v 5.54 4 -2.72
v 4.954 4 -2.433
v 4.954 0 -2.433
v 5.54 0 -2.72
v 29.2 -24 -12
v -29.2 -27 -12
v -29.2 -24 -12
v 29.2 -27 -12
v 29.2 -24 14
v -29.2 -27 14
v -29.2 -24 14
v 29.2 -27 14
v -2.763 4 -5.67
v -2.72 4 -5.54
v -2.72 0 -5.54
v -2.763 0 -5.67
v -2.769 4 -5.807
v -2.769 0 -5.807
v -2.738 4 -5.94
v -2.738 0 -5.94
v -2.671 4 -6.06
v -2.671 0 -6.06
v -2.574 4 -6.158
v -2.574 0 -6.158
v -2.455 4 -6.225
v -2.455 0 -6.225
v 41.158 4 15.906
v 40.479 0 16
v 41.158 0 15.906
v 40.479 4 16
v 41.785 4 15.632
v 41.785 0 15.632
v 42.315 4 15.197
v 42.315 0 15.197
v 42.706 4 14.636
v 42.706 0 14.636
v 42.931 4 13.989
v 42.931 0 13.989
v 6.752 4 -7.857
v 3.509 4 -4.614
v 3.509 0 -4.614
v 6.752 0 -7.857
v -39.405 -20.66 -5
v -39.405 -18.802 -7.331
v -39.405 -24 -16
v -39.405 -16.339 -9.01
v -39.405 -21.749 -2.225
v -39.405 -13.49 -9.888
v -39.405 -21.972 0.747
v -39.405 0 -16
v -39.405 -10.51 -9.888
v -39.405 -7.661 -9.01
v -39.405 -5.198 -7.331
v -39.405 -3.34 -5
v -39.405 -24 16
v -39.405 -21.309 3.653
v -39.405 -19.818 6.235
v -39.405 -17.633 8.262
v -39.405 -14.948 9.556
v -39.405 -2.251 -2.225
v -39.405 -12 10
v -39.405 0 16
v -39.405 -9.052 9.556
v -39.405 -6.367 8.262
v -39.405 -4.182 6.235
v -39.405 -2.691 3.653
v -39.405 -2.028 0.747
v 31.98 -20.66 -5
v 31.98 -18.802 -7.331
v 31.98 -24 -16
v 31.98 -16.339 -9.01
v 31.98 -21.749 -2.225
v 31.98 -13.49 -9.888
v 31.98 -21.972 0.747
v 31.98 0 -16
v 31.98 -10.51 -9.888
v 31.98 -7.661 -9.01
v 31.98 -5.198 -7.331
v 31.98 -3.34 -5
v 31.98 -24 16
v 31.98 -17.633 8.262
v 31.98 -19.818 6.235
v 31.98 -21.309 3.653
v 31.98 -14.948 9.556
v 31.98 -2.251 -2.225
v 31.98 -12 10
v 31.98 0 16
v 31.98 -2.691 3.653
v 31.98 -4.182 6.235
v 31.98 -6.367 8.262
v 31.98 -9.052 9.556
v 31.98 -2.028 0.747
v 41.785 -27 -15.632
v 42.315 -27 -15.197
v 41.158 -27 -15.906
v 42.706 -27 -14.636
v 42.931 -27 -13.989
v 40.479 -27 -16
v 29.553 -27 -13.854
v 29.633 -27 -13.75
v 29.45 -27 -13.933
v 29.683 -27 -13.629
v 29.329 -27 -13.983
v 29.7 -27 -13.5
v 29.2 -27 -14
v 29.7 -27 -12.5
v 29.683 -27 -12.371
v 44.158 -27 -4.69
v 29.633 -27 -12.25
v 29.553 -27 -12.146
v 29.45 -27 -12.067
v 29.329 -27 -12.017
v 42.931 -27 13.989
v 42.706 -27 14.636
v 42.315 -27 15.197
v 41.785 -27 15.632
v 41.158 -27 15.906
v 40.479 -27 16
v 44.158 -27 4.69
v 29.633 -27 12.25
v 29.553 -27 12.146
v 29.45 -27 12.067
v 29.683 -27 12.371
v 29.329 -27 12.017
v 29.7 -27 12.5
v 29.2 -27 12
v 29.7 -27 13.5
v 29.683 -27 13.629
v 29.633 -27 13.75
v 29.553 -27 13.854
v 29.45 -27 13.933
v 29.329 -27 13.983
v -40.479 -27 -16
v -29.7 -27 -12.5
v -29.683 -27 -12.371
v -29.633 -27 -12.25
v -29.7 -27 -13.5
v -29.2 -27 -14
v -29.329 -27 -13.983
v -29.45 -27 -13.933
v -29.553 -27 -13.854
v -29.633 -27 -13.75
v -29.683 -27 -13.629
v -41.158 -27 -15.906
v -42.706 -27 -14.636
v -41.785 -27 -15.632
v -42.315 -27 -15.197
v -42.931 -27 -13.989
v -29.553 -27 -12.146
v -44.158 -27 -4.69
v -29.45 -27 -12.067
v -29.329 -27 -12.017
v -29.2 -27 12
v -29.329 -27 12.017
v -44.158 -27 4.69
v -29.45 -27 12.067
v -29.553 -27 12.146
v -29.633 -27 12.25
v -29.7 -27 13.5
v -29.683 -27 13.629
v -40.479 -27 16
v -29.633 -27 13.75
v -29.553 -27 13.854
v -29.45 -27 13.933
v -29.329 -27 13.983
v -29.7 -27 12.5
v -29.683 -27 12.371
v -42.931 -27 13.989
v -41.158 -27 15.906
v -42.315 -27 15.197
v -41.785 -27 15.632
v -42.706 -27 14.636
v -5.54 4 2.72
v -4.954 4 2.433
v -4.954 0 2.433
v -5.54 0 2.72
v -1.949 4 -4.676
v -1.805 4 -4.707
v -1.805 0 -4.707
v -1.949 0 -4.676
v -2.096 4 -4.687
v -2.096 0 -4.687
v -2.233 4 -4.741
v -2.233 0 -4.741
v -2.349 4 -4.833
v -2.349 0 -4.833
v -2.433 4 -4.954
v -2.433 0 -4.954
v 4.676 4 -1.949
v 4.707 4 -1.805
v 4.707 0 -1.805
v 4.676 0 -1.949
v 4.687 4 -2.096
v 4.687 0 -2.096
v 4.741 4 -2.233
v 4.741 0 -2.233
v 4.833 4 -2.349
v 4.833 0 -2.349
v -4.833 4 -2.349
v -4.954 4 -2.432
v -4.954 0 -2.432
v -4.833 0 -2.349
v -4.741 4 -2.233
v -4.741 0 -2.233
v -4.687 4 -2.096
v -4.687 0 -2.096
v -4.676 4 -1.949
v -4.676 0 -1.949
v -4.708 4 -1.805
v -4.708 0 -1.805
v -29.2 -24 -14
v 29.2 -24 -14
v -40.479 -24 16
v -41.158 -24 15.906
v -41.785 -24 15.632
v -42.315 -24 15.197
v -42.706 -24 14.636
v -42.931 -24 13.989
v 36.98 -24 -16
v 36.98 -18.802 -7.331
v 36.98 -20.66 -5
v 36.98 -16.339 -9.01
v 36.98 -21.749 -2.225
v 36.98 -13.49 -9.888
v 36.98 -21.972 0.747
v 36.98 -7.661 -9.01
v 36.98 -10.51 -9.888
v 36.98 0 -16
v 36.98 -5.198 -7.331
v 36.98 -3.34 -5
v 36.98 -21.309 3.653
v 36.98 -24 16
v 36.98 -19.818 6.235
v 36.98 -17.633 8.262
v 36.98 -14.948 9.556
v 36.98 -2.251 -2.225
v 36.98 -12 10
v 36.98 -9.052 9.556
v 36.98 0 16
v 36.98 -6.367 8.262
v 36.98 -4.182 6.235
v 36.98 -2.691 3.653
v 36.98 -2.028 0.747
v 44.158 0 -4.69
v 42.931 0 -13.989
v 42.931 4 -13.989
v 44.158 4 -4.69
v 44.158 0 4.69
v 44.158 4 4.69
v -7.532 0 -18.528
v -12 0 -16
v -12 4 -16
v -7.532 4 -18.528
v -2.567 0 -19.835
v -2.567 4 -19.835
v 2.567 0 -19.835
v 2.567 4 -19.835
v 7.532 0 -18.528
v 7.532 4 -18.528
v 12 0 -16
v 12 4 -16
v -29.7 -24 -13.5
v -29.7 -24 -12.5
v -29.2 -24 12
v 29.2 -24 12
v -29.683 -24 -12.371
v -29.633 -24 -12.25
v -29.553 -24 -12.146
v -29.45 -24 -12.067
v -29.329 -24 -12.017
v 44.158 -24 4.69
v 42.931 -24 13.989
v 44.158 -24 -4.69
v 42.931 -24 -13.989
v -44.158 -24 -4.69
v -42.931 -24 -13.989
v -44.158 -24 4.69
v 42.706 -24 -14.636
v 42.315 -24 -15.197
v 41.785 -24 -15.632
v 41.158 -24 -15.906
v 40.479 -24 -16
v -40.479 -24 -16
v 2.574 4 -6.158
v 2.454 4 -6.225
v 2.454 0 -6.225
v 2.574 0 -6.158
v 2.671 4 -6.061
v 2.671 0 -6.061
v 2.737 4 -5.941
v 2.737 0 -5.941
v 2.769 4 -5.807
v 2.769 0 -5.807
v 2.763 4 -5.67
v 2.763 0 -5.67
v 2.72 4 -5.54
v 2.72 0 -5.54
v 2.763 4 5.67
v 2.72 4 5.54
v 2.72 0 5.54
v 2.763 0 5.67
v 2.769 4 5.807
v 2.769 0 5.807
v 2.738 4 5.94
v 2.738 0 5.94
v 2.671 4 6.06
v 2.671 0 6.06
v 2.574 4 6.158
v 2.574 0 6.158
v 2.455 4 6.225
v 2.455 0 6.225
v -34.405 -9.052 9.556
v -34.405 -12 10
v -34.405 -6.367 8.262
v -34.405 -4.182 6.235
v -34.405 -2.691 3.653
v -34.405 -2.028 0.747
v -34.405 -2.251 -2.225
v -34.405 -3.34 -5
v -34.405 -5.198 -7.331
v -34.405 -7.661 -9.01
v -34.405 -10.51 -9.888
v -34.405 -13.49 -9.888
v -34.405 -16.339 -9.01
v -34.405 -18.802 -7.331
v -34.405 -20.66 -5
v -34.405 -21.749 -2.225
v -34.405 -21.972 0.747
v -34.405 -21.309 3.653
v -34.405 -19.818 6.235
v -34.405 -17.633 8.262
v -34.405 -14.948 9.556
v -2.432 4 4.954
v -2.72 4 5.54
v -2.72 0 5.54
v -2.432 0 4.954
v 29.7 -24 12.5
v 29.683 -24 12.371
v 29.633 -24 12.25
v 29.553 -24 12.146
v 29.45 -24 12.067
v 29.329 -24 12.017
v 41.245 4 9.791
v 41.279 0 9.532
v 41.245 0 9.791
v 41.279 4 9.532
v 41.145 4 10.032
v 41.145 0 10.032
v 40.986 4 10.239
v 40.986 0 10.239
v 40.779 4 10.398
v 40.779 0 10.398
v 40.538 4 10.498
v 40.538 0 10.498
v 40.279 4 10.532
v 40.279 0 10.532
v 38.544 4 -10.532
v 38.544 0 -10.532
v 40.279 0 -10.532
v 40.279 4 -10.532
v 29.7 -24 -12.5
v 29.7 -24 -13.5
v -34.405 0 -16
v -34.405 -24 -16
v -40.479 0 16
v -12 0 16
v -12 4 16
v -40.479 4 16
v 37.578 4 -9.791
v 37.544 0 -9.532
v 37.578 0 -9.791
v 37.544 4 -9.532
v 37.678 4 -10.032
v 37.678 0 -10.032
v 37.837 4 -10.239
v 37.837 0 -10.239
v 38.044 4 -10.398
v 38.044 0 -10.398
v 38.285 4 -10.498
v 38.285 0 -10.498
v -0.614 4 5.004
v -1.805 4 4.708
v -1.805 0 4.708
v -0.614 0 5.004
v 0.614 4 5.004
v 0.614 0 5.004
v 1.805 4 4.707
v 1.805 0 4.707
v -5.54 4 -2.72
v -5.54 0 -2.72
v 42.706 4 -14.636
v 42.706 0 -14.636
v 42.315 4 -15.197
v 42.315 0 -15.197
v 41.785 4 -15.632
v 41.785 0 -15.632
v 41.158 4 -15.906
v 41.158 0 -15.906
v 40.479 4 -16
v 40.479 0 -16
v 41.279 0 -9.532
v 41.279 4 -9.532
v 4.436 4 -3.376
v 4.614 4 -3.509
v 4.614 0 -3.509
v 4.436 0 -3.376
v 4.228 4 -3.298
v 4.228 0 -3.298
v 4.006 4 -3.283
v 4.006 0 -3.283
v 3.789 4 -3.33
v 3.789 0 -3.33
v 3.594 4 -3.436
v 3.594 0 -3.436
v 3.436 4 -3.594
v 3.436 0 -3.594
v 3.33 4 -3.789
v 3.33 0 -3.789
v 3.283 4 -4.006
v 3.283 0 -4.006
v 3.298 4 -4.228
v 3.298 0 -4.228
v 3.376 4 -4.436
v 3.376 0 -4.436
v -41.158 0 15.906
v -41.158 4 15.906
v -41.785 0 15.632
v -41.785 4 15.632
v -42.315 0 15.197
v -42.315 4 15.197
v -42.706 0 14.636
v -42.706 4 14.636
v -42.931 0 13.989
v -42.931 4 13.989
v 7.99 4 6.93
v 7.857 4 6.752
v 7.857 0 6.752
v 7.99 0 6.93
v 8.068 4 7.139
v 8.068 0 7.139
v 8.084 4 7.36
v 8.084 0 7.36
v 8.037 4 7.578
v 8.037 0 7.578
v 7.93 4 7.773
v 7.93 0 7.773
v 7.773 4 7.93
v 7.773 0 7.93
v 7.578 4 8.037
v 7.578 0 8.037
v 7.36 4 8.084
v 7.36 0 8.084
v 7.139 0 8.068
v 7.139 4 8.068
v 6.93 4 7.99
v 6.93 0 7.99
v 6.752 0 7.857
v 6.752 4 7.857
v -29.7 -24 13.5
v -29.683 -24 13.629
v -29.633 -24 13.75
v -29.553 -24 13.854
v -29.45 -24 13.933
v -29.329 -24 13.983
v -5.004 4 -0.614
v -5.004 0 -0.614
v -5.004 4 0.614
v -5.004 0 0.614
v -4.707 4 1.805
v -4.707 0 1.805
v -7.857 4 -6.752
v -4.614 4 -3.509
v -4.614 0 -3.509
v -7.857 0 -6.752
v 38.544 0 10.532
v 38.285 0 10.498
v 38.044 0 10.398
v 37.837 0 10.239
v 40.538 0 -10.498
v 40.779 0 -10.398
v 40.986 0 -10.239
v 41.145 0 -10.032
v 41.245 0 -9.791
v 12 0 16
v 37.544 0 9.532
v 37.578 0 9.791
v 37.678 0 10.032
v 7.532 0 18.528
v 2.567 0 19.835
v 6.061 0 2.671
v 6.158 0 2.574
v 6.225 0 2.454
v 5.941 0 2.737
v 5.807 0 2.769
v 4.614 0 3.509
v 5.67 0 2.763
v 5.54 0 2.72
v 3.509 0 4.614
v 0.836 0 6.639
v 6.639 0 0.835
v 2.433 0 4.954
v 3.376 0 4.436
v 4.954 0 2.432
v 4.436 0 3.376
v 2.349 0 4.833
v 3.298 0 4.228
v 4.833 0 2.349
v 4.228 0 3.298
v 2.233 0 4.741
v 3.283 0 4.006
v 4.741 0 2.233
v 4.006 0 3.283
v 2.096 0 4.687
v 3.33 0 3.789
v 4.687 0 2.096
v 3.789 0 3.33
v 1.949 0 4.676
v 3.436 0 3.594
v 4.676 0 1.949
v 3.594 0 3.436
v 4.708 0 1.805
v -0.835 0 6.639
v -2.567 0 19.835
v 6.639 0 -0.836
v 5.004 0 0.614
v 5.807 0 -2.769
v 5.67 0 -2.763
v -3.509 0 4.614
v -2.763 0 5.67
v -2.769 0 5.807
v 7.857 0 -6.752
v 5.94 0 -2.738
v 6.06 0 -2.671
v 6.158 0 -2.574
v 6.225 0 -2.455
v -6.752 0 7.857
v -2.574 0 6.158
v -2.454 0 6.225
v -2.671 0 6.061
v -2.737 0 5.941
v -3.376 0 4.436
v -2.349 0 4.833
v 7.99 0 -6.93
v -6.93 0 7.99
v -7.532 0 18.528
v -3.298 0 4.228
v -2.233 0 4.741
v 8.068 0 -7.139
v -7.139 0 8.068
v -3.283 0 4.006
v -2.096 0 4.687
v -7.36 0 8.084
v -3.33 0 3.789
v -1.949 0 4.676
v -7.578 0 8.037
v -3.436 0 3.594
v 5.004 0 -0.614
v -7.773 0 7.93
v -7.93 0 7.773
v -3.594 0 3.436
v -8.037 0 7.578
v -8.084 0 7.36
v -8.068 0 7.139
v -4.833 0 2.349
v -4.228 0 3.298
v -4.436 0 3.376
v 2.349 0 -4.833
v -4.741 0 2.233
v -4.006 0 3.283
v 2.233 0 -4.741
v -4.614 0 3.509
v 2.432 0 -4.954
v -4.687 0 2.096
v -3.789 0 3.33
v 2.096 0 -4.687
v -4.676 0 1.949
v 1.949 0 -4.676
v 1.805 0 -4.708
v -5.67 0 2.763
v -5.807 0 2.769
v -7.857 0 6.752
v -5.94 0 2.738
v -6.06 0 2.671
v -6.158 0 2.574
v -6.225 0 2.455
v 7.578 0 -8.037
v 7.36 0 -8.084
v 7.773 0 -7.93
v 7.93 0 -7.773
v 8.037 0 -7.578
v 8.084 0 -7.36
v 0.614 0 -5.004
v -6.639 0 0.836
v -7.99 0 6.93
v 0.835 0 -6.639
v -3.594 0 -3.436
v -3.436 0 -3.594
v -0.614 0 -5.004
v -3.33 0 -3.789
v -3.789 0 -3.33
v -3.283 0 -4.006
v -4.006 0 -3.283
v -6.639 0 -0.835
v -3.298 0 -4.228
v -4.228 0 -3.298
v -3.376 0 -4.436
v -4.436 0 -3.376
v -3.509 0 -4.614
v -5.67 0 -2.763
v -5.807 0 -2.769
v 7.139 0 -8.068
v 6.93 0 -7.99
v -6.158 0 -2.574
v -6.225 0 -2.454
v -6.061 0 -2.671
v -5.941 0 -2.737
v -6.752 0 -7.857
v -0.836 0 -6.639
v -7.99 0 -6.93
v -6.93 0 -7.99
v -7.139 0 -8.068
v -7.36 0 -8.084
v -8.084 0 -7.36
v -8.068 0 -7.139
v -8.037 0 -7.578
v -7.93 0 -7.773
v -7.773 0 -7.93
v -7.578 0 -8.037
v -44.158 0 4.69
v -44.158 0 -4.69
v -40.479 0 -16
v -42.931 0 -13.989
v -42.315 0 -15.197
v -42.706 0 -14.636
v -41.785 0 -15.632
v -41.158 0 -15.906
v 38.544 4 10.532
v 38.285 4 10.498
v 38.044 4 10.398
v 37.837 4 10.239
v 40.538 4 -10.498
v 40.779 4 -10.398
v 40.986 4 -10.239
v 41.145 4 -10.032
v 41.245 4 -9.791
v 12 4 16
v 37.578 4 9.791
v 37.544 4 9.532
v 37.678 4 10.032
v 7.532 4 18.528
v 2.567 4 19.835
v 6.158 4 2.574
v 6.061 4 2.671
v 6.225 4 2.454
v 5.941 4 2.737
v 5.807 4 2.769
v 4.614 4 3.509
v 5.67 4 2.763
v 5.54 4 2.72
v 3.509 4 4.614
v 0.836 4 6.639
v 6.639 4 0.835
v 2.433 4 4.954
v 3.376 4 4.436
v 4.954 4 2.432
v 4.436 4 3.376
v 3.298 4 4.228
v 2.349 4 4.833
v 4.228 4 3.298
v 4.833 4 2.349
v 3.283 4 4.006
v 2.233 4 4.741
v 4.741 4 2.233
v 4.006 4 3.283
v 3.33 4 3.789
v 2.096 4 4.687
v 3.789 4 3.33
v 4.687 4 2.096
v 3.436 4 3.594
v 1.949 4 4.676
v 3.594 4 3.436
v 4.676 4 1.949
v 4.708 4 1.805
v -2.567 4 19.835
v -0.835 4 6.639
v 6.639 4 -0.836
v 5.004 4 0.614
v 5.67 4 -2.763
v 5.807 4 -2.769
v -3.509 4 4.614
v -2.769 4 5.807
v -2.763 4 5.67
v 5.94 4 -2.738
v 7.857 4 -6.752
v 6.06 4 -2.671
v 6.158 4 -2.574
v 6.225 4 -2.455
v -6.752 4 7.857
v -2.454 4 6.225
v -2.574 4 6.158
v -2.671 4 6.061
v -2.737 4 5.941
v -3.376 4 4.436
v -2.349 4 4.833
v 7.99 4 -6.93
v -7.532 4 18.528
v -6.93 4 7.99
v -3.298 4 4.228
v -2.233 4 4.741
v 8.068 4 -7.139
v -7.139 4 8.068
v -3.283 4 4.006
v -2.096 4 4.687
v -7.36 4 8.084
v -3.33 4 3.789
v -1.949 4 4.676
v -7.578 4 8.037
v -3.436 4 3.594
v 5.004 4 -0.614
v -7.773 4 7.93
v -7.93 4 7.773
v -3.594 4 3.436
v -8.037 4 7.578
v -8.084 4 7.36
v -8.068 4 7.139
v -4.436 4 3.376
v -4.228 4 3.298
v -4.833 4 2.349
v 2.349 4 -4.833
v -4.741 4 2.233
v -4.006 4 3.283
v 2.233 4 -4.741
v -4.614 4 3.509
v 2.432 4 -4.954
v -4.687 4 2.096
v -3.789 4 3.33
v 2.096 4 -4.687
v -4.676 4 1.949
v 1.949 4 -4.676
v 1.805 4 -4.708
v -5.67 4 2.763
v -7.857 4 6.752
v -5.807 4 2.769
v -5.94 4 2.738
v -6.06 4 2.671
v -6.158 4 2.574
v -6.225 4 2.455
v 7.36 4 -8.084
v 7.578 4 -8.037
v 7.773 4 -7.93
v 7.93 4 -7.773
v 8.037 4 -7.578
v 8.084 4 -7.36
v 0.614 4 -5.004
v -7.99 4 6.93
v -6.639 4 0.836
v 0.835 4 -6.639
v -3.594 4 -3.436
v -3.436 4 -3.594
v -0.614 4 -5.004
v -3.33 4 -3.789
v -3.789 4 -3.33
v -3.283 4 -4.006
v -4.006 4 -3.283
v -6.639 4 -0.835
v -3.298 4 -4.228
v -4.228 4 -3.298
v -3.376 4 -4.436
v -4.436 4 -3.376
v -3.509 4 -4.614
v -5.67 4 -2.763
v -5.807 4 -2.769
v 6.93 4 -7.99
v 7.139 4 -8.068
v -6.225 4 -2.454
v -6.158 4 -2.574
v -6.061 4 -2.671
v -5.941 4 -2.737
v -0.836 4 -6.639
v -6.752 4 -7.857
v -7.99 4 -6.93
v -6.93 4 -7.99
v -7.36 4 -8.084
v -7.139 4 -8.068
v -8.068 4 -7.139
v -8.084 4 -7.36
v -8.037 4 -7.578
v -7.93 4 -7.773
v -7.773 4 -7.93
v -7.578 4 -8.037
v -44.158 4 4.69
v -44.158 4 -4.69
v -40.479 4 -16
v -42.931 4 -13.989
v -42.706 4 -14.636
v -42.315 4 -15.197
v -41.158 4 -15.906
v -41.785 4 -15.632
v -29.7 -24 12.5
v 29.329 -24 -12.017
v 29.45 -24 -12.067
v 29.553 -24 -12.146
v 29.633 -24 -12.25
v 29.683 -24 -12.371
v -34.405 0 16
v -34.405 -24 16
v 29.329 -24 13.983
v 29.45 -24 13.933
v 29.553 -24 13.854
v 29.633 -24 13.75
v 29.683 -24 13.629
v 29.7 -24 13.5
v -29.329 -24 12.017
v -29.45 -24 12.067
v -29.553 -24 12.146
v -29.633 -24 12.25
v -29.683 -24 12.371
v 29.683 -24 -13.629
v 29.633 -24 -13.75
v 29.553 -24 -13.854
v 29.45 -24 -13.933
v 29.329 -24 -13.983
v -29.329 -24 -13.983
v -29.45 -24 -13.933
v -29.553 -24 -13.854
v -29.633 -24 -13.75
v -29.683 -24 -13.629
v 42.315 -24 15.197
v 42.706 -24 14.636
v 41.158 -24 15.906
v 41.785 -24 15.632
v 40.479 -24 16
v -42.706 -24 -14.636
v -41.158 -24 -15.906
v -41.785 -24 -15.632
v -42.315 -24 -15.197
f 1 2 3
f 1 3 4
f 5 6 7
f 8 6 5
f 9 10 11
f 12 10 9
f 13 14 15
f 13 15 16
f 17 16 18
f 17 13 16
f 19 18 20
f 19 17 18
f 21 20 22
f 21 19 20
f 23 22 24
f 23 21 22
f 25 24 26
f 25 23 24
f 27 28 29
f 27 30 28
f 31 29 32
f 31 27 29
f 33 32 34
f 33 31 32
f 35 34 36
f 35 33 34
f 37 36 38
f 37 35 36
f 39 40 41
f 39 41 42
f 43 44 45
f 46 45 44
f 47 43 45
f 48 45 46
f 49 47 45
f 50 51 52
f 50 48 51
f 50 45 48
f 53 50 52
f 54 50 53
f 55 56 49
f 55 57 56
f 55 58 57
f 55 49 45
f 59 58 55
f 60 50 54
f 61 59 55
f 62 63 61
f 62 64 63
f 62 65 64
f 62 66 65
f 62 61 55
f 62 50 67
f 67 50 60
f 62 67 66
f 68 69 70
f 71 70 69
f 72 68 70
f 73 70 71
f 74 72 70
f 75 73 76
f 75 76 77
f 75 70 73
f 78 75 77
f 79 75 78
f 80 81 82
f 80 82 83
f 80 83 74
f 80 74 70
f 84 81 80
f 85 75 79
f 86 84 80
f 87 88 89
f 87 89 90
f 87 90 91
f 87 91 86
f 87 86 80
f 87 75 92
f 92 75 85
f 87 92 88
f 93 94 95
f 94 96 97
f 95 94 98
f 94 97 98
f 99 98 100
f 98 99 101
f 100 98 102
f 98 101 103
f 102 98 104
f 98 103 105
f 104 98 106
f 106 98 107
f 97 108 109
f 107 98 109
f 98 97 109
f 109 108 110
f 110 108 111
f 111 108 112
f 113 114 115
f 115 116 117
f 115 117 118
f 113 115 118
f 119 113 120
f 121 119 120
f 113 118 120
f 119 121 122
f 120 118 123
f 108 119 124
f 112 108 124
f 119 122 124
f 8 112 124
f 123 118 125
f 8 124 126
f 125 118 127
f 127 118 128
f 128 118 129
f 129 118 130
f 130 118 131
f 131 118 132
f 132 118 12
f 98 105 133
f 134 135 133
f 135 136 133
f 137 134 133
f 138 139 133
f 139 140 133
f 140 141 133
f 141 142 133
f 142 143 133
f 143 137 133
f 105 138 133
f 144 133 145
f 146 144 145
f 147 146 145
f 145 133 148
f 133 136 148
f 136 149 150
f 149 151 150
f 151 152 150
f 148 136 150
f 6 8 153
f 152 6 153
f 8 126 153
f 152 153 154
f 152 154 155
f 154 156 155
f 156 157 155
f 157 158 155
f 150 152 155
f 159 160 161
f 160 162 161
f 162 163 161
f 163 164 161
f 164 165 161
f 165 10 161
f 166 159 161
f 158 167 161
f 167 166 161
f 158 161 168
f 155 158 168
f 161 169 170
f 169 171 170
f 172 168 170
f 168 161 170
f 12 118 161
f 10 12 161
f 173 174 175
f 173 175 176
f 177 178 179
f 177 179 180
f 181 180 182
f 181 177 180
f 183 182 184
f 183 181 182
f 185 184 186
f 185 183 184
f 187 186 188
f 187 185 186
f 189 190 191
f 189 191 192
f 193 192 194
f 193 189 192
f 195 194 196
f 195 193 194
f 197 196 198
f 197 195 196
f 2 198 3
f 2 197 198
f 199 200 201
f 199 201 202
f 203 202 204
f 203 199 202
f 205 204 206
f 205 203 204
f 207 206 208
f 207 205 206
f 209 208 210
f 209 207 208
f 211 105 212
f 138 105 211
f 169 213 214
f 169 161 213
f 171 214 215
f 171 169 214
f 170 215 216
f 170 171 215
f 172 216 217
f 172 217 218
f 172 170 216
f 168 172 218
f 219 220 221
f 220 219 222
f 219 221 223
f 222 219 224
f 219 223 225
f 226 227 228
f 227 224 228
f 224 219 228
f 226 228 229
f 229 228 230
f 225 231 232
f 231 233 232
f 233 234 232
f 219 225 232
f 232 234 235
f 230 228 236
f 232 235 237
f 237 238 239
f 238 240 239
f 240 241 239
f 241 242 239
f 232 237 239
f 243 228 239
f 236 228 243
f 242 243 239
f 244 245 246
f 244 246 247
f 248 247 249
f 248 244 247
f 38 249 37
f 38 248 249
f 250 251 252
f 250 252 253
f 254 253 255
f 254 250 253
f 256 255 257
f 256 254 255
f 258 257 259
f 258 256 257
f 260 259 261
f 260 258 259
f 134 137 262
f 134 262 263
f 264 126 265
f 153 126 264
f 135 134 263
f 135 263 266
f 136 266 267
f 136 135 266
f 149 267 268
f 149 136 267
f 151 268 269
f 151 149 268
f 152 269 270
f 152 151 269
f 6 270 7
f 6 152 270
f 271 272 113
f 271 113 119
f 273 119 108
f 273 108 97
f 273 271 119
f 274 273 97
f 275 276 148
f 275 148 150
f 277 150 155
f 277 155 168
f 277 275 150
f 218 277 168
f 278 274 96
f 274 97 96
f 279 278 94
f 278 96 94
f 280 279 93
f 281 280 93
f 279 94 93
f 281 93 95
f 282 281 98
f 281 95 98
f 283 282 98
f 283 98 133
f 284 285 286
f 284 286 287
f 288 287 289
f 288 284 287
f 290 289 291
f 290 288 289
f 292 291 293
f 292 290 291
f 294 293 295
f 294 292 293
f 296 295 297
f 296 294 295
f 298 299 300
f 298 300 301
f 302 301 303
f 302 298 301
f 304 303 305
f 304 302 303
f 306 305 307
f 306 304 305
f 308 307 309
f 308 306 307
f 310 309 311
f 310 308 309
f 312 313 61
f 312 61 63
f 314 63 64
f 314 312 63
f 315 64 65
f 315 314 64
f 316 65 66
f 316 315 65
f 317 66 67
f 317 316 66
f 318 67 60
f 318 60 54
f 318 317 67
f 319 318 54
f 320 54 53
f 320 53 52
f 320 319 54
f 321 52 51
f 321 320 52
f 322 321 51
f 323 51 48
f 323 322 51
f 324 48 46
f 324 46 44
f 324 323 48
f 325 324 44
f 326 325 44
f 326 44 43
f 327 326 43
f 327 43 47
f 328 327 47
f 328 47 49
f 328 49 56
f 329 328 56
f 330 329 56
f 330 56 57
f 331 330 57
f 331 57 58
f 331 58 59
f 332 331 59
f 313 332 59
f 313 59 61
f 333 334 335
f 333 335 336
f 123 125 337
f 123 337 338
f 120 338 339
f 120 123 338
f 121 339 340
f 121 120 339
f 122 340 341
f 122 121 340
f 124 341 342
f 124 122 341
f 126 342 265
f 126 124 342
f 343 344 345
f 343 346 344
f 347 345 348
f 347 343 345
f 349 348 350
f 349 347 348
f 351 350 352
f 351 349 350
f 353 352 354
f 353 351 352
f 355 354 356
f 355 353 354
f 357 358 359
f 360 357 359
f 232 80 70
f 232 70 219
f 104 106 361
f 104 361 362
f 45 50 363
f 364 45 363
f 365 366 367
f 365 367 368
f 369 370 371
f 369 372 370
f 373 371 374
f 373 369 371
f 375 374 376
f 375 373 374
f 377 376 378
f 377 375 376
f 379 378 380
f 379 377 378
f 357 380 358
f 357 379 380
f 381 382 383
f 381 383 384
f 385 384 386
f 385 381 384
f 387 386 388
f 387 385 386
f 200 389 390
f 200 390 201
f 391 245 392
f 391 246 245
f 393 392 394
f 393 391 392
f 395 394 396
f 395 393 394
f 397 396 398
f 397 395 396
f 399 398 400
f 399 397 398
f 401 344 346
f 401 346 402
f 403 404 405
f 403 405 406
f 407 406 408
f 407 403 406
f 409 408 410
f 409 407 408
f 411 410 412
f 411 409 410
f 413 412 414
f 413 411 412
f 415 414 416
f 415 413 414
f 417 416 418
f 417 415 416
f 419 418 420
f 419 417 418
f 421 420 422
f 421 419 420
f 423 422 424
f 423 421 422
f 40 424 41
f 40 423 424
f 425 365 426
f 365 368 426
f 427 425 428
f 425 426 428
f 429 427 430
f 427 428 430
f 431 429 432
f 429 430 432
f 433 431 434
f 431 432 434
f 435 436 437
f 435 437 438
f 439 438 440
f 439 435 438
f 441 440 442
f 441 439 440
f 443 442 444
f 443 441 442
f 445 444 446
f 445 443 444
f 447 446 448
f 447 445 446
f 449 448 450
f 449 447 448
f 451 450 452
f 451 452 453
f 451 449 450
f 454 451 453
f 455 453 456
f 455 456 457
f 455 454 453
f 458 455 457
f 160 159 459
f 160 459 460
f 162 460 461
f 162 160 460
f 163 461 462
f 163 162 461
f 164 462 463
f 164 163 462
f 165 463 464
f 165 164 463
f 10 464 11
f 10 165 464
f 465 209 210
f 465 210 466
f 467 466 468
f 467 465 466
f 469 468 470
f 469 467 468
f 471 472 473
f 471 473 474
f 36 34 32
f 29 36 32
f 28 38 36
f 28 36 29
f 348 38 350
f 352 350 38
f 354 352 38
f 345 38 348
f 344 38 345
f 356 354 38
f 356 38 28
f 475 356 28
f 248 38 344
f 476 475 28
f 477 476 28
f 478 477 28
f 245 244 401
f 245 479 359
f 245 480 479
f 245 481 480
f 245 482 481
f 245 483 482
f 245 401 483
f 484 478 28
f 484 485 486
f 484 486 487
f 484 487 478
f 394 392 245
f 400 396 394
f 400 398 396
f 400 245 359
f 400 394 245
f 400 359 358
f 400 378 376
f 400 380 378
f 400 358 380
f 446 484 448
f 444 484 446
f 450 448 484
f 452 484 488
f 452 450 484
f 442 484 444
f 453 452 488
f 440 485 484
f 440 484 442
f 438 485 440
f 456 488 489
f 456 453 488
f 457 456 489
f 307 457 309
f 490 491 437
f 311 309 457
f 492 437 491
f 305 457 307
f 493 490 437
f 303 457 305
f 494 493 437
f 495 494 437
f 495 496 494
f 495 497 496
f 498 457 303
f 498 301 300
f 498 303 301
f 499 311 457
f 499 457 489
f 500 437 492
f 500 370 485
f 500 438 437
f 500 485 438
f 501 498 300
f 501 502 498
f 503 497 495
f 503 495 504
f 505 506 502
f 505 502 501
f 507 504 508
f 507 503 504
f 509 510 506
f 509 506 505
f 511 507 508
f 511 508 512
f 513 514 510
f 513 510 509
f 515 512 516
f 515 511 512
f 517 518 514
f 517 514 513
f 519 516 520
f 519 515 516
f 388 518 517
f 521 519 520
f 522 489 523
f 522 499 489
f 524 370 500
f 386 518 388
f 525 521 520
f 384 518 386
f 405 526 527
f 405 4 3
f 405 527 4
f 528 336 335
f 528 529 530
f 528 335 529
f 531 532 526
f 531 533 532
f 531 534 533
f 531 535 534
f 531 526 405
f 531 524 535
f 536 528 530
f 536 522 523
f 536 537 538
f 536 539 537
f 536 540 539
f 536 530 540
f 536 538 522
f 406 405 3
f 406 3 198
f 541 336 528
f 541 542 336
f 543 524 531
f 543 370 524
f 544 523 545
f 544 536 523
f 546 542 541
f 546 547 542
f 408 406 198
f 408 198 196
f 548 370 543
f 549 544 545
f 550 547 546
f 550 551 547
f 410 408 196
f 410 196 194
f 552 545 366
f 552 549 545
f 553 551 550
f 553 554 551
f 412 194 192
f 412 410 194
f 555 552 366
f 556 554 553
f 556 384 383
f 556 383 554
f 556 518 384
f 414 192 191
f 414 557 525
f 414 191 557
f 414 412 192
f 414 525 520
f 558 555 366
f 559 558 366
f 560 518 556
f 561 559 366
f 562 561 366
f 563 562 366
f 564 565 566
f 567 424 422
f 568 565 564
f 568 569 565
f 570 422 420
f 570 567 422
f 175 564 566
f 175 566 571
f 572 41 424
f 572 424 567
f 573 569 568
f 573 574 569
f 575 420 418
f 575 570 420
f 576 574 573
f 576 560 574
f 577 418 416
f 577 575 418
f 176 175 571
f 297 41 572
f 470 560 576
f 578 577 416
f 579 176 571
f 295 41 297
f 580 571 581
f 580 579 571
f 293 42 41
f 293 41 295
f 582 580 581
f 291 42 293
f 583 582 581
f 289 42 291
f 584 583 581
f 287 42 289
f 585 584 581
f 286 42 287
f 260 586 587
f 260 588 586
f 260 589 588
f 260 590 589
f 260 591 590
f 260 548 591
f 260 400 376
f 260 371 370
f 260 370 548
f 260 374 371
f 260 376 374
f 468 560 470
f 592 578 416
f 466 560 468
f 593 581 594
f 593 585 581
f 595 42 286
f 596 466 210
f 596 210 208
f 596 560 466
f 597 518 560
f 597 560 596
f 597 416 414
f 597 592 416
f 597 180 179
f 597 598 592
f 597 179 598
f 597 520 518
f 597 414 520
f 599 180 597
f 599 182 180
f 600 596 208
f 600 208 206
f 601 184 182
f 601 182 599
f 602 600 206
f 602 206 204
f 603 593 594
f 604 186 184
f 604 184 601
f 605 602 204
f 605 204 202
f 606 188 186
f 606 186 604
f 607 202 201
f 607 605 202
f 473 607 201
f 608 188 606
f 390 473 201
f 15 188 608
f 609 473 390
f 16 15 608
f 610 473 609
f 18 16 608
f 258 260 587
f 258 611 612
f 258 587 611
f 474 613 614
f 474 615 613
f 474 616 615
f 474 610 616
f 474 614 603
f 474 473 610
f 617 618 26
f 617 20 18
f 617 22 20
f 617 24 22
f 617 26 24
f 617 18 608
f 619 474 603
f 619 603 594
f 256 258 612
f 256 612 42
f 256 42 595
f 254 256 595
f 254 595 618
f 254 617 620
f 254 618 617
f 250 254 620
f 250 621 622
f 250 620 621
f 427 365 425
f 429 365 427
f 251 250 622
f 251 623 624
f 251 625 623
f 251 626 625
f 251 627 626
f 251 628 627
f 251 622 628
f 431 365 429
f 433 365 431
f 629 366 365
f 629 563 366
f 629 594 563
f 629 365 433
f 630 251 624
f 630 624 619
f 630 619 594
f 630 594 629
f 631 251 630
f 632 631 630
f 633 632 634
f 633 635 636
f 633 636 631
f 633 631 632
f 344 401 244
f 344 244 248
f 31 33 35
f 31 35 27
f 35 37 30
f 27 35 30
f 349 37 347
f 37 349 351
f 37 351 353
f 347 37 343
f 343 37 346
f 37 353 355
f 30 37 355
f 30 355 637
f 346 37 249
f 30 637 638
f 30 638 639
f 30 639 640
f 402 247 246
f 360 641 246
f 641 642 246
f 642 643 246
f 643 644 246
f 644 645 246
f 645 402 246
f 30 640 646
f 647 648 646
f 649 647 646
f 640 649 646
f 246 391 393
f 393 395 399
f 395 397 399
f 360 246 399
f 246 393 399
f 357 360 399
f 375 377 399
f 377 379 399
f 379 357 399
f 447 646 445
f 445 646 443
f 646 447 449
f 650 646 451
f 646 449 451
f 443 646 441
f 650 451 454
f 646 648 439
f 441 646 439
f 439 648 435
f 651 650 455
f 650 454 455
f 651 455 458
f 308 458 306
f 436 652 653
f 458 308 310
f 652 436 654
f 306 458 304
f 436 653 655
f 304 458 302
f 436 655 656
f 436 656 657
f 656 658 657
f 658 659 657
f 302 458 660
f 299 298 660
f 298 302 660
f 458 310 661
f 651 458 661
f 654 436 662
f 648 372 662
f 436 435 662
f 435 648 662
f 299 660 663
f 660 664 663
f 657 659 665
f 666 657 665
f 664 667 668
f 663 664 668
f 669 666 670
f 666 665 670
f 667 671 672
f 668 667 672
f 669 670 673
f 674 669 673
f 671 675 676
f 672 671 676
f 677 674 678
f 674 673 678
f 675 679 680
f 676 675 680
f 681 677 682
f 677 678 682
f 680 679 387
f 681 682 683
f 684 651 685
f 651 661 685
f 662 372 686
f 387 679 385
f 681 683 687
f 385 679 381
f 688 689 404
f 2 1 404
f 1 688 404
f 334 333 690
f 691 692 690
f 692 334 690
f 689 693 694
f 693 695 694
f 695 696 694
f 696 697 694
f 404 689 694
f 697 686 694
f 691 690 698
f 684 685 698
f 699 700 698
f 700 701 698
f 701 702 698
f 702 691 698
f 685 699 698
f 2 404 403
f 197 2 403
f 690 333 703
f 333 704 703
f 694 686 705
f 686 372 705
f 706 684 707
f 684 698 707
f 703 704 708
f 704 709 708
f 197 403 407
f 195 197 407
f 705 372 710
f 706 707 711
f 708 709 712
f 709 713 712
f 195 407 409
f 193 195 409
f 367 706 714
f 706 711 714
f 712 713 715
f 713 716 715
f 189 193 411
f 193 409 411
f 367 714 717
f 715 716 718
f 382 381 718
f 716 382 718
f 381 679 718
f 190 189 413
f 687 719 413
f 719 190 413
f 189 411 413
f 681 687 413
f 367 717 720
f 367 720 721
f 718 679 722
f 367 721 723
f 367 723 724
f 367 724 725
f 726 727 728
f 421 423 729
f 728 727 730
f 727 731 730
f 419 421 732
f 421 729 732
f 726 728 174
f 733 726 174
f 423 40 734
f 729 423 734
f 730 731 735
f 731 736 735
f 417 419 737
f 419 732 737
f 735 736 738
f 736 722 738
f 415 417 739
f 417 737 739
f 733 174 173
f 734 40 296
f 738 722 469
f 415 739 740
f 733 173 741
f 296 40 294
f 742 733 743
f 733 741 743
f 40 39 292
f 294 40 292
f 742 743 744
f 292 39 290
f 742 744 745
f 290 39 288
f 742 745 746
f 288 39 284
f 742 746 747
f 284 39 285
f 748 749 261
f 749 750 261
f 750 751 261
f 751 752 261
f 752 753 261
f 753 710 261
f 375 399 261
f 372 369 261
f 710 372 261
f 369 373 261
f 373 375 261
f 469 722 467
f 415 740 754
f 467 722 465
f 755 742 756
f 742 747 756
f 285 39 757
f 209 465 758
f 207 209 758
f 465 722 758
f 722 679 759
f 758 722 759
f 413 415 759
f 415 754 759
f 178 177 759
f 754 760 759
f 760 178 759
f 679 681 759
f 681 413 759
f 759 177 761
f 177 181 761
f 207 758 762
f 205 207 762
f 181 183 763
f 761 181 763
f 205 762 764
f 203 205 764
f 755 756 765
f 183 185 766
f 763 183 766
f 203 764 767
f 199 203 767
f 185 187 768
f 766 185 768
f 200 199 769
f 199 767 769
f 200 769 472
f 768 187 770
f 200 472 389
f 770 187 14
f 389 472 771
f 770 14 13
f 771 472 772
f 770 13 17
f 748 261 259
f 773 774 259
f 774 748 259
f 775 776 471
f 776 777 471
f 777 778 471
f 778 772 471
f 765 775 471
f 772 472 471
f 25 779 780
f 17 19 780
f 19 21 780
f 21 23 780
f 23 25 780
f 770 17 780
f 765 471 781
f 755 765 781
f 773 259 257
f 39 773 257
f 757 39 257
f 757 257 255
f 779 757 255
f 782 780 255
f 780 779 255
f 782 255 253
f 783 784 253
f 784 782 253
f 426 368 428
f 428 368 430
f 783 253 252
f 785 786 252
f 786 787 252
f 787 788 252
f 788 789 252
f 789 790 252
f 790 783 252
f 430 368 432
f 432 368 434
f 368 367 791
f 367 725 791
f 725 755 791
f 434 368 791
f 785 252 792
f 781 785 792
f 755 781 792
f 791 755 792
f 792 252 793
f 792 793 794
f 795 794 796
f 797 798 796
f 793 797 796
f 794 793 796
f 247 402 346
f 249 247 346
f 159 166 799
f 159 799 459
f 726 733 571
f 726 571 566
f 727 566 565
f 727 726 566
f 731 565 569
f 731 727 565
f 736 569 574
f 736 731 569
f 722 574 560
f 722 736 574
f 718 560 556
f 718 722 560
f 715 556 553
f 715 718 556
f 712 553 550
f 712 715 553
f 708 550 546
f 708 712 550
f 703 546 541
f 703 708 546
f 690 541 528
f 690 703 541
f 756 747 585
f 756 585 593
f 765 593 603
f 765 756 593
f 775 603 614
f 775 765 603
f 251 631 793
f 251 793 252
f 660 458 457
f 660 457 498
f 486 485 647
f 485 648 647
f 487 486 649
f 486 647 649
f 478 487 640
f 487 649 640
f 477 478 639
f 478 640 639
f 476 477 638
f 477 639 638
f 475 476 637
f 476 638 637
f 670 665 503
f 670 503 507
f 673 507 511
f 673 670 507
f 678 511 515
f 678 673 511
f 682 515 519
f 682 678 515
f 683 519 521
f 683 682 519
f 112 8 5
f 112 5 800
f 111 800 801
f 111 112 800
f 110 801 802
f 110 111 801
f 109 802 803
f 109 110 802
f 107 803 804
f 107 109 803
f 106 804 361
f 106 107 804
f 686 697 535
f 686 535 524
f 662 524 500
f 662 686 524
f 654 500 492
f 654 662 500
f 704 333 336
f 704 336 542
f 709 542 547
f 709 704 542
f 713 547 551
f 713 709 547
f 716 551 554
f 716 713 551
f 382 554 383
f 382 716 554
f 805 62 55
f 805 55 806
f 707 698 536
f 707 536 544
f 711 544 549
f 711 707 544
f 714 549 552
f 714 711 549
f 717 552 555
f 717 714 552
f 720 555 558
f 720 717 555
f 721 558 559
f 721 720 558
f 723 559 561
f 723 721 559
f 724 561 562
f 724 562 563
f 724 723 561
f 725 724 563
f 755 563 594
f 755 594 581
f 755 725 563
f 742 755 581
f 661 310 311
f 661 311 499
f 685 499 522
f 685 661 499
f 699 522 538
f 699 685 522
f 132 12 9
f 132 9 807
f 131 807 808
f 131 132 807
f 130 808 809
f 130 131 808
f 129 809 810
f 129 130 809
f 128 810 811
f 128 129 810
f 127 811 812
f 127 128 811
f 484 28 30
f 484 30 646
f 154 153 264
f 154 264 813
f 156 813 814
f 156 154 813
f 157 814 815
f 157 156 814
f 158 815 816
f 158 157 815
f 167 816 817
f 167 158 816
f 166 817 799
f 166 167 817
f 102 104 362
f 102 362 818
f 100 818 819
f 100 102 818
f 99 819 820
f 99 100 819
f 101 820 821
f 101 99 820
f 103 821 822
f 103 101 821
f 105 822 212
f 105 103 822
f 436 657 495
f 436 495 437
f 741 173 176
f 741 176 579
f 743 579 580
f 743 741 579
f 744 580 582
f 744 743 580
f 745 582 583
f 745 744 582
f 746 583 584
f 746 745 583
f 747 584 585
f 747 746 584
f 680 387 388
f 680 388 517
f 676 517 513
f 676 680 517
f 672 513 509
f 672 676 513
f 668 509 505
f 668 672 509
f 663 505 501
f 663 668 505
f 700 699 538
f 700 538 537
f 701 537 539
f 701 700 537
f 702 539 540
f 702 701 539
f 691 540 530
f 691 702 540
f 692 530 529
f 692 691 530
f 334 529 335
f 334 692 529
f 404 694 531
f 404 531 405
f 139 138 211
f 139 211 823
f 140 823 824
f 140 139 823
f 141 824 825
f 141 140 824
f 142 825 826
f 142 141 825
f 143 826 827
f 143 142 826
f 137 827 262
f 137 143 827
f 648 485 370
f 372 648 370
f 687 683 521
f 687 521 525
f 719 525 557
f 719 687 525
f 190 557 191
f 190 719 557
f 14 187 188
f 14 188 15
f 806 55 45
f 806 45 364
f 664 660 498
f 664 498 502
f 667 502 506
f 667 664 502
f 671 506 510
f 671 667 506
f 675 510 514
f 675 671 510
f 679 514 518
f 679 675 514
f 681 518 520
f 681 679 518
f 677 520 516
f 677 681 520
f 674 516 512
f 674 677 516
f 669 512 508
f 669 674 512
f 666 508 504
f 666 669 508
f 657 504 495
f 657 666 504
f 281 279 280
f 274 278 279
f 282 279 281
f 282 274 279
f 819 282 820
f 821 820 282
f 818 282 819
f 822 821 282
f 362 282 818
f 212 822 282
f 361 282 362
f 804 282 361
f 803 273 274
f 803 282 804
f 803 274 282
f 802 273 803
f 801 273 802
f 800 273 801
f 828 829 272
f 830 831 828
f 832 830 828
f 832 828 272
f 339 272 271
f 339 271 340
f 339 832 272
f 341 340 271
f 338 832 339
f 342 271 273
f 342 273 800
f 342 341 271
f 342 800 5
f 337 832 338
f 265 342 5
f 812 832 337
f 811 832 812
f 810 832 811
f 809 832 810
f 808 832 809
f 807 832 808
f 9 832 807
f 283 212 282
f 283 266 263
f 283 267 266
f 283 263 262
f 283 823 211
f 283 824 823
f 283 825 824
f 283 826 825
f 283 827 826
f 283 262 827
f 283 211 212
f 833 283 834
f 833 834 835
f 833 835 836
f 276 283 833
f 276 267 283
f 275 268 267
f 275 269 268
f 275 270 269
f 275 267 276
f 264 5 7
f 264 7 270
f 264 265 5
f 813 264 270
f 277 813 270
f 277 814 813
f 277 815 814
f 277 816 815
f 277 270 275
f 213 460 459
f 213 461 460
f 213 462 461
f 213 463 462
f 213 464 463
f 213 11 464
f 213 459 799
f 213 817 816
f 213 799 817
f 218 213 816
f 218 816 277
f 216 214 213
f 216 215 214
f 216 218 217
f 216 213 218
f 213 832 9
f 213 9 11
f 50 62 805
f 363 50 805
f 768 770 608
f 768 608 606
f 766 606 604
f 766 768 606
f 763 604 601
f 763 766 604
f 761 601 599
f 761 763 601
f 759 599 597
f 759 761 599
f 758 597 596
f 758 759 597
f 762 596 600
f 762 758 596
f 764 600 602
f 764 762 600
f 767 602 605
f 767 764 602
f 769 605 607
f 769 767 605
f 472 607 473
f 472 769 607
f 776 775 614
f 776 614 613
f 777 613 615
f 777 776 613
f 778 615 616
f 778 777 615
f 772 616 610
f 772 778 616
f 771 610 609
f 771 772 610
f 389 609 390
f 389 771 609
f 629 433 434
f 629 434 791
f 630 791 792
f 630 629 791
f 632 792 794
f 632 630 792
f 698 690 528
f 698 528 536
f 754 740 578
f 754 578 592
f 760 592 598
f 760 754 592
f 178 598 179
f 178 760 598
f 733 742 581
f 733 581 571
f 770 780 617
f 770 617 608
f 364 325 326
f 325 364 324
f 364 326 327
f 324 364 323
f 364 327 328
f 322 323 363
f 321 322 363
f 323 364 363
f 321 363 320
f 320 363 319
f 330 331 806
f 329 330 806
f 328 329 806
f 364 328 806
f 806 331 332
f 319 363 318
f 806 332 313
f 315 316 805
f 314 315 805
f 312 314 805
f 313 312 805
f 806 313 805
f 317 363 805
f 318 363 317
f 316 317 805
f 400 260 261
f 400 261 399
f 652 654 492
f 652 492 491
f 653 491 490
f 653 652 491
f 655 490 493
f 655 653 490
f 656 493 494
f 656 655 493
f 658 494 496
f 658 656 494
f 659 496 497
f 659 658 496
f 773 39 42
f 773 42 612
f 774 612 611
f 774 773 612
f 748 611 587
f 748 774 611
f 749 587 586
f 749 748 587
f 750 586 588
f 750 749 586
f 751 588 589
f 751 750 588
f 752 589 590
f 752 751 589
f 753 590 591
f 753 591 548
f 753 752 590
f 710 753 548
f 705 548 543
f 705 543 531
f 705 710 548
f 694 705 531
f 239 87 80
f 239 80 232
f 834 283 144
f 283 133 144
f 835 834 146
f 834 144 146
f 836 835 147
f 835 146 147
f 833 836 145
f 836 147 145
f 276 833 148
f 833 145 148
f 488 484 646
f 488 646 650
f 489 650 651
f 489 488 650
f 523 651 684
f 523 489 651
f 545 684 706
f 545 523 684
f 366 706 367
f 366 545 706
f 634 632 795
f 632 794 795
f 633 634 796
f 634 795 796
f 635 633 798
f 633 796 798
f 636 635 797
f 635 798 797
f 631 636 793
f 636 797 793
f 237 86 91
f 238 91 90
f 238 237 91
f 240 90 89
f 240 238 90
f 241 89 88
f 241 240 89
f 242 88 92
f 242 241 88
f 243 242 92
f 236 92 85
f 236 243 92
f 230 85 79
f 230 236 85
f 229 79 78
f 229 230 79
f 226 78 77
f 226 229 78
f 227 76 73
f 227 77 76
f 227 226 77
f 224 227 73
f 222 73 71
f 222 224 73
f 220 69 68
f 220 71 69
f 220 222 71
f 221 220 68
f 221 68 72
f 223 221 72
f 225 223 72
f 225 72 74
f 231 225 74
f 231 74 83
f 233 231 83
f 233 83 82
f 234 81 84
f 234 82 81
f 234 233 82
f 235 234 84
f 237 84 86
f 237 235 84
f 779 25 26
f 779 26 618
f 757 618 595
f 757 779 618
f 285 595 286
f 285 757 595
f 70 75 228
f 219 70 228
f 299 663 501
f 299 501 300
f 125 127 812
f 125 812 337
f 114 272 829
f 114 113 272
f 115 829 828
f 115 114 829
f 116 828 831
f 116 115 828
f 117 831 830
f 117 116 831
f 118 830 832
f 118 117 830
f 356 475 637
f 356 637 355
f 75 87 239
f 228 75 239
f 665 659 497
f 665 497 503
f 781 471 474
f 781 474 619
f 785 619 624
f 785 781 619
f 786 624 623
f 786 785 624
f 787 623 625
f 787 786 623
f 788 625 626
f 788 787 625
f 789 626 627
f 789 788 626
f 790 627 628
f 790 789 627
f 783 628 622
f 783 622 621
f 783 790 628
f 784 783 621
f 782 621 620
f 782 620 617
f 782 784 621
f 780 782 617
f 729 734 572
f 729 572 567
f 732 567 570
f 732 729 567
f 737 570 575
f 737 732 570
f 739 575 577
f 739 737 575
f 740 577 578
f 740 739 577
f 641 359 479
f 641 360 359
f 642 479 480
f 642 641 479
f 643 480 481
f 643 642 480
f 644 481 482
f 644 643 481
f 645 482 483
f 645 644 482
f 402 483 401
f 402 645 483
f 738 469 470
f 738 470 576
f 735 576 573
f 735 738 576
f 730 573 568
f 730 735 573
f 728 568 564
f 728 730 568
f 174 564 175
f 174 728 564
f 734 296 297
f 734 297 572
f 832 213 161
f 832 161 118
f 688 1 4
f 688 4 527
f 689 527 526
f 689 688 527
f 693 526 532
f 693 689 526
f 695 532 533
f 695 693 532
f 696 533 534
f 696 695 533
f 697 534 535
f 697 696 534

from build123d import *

# Parameters (mm, degrees)
SKETCH3_W             = 3.734694983
SKETCH3_H             = 21.06352889
BOSS_EXTRUDE1_DEPTH   = 4
SKETCH4_W             = 5
SKETCH4_H             = 32
BOSS_EXTRUDE2_DEPTH   = 24
BOSS_EXTRUDE2_2_DEPTH = 24
BOSS_EXTRUDE3_DEPTH   = 3
CUT_EXTRUDE1_DEPTH    = 3
FILLET3_R             = 2.5
FILLET4_R             = 2.5
FILLET5_R             = 1
CUT_EXTRUDE2_DEPTH    = 4
CUT_EXTRUDE3_START    = -76.384302
SKETCH8_R             = 10
CUT_EXTRUDE3_DEPTH    = 76.384302


with BuildPart() as part:
    # Sketch3 → Boss-Extrude1 (new body)
    with BuildSketch(Plane(origin=(0, 0, 0), x_dir=(1, 0, 0), z_dir=(0, 1, 0))):
        with BuildLine():
            Line((-12, -16), (-42.5, -16))
            ThreePointArc((-42.5, -16), (-44.311632106, 0), (-42.5, 16))
            Line((-42.5, 16), (-12, 16))
            ThreePointArc((-12, 16), (0, 20), (12, 16))
            Line((12, 16), (42.5, 16))
            ThreePointArc((42.5, 16), (44.311632106, 0), (42.5, -16))
            Line((42.5, -16), (12, -16))
            ThreePointArc((12, -16), (0, -20), (-12, -16))
        make_face()
        with Locations((39.411338735, 0)):
            Rectangle(SKETCH3_W, SKETCH3_H, mode=Mode.SUBTRACT)
    extrude(amount=BOSS_EXTRUDE1_DEPTH)

    # Fillet4
    fillet4_edges = [part.edges().sort_by_distance(p)[0] for p in [
        (-42.5, 2, -16),
        (42.5, 2, -16),
        (42.5, 2, 16),
        (-42.5, 2, 16),
    ]]
    fillet(fillet4_edges, radius=FILLET4_R)

    # Fillet5
    fillet5_edges = [part.edges().sort_by_distance(p)[0] for p in [
        (41.278686226, 2, 10.531764445),
        (41.278686226, 2, -10.531764445),
        (37.543991243, 2, -10.531764445),
        (37.543991243, 2, 10.531764445),
    ]]
    fillet(fillet5_edges, radius=FILLET5_R)

    # Sketch7 → Cut-Extrude2 (cut)
    with BuildSketch(Plane(origin=(0, 4, 0), x_dir=(1, 0, 0), z_dir=(0, 1, 0))):
        with BuildLine():
            Line((4.614223874, -3.509411454), (7.857111921, -6.752299502))
            ThreePointArc((7.857111921, -6.752299502), (7.857111921, -7.857111921), (6.752299502, -7.857111921))
            Line((6.752299502, -7.857111921), (3.509411454, -4.614223874))
            ThreePointArc((3.509411454, -4.614223874), (3.509411454, -3.509411454), (4.614223874, -3.509411454))
        make_face()
        with BuildLine():
            Line((-2.432634641, 4.953953344), (-2.720178393, 5.539523536))
            ThreePointArc((-2.720178393, 5.539523536), (-2.73764907, 5.940419304), (-2.454793449, 6.225051239))
            ThreePointArc((-2.454793449, 6.225051239), (-0.000193165, 6.691582307), (2.45443405, 6.225192953))
            ThreePointArc((2.45443405, 6.225192953), (2.737306103, 5.940577348), (2.719858572, 5.539680573))
            Line((2.719858572, 5.539680573), (2.432348627, 4.954093781))
            ThreePointArc((2.432348627, 4.954093781), (2.166276684, 4.709049338), (1.804560078, 4.707581634))
            ThreePointArc((1.804560078, 4.707581634), (-0.000145535, 5.041603108), (-1.804831861, 4.707477443))
            ThreePointArc((-1.804831861, 4.707477443), (-2.166548551, 4.708924263), (-2.432634641, 4.953953344))
        make_face()
        with BuildLine():
            Line((4.953953344, 2.432634641), (5.539523536, 2.720178393))
            ThreePointArc((5.539523536, 2.720178393), (5.940419304, 2.73764907), (6.225051239, 2.454793449))
            ThreePointArc((6.225051239, 2.454793449), (6.691582307, 0.000193165), (6.225192953, -2.45443405))
            ThreePointArc((6.225192953, -2.45443405), (5.940577348, -2.737306103), (5.539680573, -2.719858572))
            Line((5.539680573, -2.719858572), (4.954093781, -2.432348627))
            ThreePointArc((4.954093781, -2.432348627), (4.709049338, -2.166276684), (4.707581634, -1.804560078))
            ThreePointArc((4.707581634, -1.804560078), (5.041603108, 0.000145535), (4.707477443, 1.804831861))
            ThreePointArc((4.707477443, 1.804831861), (4.708924263, 2.166548551), (4.953953344, 2.432634641))
        make_face()
        with BuildLine():
            Line((2.432634641, -4.953953344), (2.720178393, -5.539523536))
            ThreePointArc((2.720178393, -5.539523536), (2.73764907, -5.940419304), (2.454793449, -6.225051239))
            ThreePointArc((2.454793449, -6.225051239), (0.000193165, -6.691582307), (-2.45443405, -6.225192953))
            ThreePointArc((-2.45443405, -6.225192953), (-2.737306103, -5.940577348), (-2.719858572, -5.539680573))
            Line((-2.719858572, -5.539680573), (-2.432348627, -4.954093781))
            ThreePointArc((-2.432348627, -4.954093781), (-2.166276684, -4.709049338), (-1.804560078, -4.707581634))
            ThreePointArc((-1.804560078, -4.707581634), (0.000145535, -5.041603108), (1.804831861, -4.707477443))
            ThreePointArc((1.804831861, -4.707477443), (2.166548551, -4.708924263), (2.432634641, -4.953953344))
        make_face()
        with BuildLine():
            Line((-4.953953344, -2.432634641), (-5.539523536, -2.720178393))
            ThreePointArc((-5.539523536, -2.720178393), (-5.940419304, -2.73764907), (-6.225051239, -2.454793449))
            ThreePointArc((-6.225051239, -2.454793449), (-6.691582307, -0.000193165), (-6.225192953, 2.45443405))
            ThreePointArc((-6.225192953, 2.45443405), (-5.940577348, 2.737306103), (-5.539680573, 2.719858572))
            Line((-5.539680573, 2.719858572), (-4.954093781, 2.432348627))
            ThreePointArc((-4.954093781, 2.432348627), (-4.709049338, 2.166276684), (-4.707581634, 1.804560078))
            ThreePointArc((-4.707581634, 1.804560078), (-5.041603108, -0.000145535), (-4.707477443, -1.804831861))
            ThreePointArc((-4.707477443, -1.804831861), (-4.708924263, -2.166548551), (-4.953953344, -2.432634641))
        make_face()
        with BuildLine():
            Line((3.509411454, 4.614223874), (6.752299502, 7.857111921))
            ThreePointArc((6.752299502, 7.857111921), (7.857111921, 7.857111921), (7.857111921, 6.752299502))
            Line((7.857111921, 6.752299502), (4.614223874, 3.509411454))
            ThreePointArc((4.614223874, 3.509411454), (3.509411454, 3.509411454), (3.509411454, 4.614223874))
        make_face()
        with BuildLine():
            Line((-3.509411454, -4.614223874), (-6.752299502, -7.857111921))
            ThreePointArc((-6.752299502, -7.857111921), (-7.857111921, -7.857111921), (-7.857111921, -6.752299502))
            Line((-7.857111921, -6.752299502), (-4.614223874, -3.509411454))
            ThreePointArc((-4.614223874, -3.509411454), (-3.509411454, -3.509411454), (-3.509411454, -4.614223874))
        make_face()
        with BuildLine():
            Line((-4.614223874, 3.509411454), (-7.857111921, 6.752299502))
            ThreePointArc((-7.857111921, 6.752299502), (-7.857111921, 7.857111921), (-6.752299502, 7.857111921))
            Line((-6.752299502, 7.857111921), (-3.509411454, 4.614223874))
            ThreePointArc((-3.509411454, 4.614223874), (-3.509411454, 3.509411454), (-4.614223874, 3.509411454))
        make_face()
    extrude(amount=-CUT_EXTRUDE2_DEPTH, mode=Mode.SUBTRACT)


with BuildPart() as body_2:
    # Sketch4 → Boss-Extrude2 (new body)
    with BuildSketch(Plane.XZ):
        with Locations((-36.904713213, 0)):
            Rectangle(SKETCH4_W, SKETCH4_H)
    extrude(amount=BOSS_EXTRUDE2_DEPTH)


with BuildPart() as body_3:
    # Sketch4 → Boss-Extrude2 2 (new body)
    with BuildSketch(Plane.XZ):
        with Locations((34.479588459, 0)):
            Rectangle(SKETCH4_W, SKETCH4_H)
    extrude(amount=BOSS_EXTRUDE2_2_DEPTH)


with BuildPart() as body_4:
    # Sketch5 → Boss-Extrude3 (new body)
    with BuildSketch(Plane.XZ.offset(24)):
        with BuildLine():
            Line((-12, 16), (12, 16))
            Line((12, 16), (42.5, 16))
            ThreePointArc((42.5, 16), (44.311632106, 0), (42.5, -16))
            Line((42.5, -16), (12, -16))
            Line((12, -16), (-12, -16))
            Line((-12, -16), (-42.5, -16))
            ThreePointArc((-42.5, -16), (-44.311632106, 0), (-42.5, 16))
            Line((-42.5, 16), (-12, 16))
        make_face()
    extrude(amount=BOSS_EXTRUDE3_DEPTH)

    # Sketch6 → Cut-Extrude1 (cut)
    with BuildSketch(Plane.XZ.offset(27)):
        with BuildLine():
            Line((-29.199625594, -12), (29.199625594, -12))
            ThreePointArc((29.199625594, -12), (29.553178985, -12.146446609), (29.699625594, -12.5))
            Line((29.699625594, -12.5), (29.699625594, -13.5))
            ThreePointArc((29.699625594, -13.5), (29.553178985, -13.853553391), (29.199625594, -14))
            Line((29.199625594, -14), (-29.199625594, -14))
            ThreePointArc((-29.199625594, -14), (-29.553178985, -13.853553391), (-29.699625594, -13.5))
            Line((-29.699625594, -13.5), (-29.699625594, -12.5))
            ThreePointArc((-29.699625594, -12.5), (-29.553178985, -12.146446609), (-29.199625594, -12))
        make_face()
        with BuildLine():
            Line((-29.199625594, 14), (29.199625594, 14))
            ThreePointArc((29.199625594, 14), (29.553178985, 13.853553391), (29.699625594, 13.5))
            Line((29.699625594, 13.5), (29.699625594, 12.5))
            ThreePointArc((29.699625594, 12.5), (29.553178985, 12.146446609), (29.199625594, 12))
            Line((29.199625594, 12), (-29.199625594, 12))
            ThreePointArc((-29.199625594, 12), (-29.553178985, 12.146446609), (-29.699625594, 12.5))
            Line((-29.699625594, 12.5), (-29.699625594, 13.5))
            ThreePointArc((-29.699625594, 13.5), (-29.553178985, 13.853553391), (-29.199625594, 14))
        make_face()
    extrude(amount=-CUT_EXTRUDE1_DEPTH, mode=Mode.SUBTRACT)

    # Fillet3
    fillet3_edges = [body_4.edges().sort_by_distance(p)[0] for p in [
        (-42.5, -25.5, 16),
        (42.5, -25.5, 16),
        (42.5, -25.5, -16),
        (-42.5, -25.5, -16),
    ]]
    fillet(fillet3_edges, radius=FILLET3_R)


with BuildPart() as cut_extrude3_tool:
    # Sketch8 → Cut-Extrude3 (new body)
    with BuildSketch(Plane.ZY.offset(39.404713213).offset(CUT_EXTRUDE3_START)):
        with Locations((0, -12)):
            Circle(SKETCH8_R)
    extrude(amount=CUT_EXTRUDE3_DEPTH)


with BuildPart() as body_2_1:
    add(body_2.part)

    # Cut-Extrude3: cut by cut_extrude3_tool
    add(cut_extrude3_tool.part, mode=Mode.SUBTRACT)


with BuildPart() as body_3_1:
    add(body_3.part)

    # Cut-Extrude3: cut by cut_extrude3_tool
    add(cut_extrude3_tool.part, mode=Mode.SUBTRACT)


solid = Compound([part.part, body_4.part, body_2_1.part, body_3_1.part])
